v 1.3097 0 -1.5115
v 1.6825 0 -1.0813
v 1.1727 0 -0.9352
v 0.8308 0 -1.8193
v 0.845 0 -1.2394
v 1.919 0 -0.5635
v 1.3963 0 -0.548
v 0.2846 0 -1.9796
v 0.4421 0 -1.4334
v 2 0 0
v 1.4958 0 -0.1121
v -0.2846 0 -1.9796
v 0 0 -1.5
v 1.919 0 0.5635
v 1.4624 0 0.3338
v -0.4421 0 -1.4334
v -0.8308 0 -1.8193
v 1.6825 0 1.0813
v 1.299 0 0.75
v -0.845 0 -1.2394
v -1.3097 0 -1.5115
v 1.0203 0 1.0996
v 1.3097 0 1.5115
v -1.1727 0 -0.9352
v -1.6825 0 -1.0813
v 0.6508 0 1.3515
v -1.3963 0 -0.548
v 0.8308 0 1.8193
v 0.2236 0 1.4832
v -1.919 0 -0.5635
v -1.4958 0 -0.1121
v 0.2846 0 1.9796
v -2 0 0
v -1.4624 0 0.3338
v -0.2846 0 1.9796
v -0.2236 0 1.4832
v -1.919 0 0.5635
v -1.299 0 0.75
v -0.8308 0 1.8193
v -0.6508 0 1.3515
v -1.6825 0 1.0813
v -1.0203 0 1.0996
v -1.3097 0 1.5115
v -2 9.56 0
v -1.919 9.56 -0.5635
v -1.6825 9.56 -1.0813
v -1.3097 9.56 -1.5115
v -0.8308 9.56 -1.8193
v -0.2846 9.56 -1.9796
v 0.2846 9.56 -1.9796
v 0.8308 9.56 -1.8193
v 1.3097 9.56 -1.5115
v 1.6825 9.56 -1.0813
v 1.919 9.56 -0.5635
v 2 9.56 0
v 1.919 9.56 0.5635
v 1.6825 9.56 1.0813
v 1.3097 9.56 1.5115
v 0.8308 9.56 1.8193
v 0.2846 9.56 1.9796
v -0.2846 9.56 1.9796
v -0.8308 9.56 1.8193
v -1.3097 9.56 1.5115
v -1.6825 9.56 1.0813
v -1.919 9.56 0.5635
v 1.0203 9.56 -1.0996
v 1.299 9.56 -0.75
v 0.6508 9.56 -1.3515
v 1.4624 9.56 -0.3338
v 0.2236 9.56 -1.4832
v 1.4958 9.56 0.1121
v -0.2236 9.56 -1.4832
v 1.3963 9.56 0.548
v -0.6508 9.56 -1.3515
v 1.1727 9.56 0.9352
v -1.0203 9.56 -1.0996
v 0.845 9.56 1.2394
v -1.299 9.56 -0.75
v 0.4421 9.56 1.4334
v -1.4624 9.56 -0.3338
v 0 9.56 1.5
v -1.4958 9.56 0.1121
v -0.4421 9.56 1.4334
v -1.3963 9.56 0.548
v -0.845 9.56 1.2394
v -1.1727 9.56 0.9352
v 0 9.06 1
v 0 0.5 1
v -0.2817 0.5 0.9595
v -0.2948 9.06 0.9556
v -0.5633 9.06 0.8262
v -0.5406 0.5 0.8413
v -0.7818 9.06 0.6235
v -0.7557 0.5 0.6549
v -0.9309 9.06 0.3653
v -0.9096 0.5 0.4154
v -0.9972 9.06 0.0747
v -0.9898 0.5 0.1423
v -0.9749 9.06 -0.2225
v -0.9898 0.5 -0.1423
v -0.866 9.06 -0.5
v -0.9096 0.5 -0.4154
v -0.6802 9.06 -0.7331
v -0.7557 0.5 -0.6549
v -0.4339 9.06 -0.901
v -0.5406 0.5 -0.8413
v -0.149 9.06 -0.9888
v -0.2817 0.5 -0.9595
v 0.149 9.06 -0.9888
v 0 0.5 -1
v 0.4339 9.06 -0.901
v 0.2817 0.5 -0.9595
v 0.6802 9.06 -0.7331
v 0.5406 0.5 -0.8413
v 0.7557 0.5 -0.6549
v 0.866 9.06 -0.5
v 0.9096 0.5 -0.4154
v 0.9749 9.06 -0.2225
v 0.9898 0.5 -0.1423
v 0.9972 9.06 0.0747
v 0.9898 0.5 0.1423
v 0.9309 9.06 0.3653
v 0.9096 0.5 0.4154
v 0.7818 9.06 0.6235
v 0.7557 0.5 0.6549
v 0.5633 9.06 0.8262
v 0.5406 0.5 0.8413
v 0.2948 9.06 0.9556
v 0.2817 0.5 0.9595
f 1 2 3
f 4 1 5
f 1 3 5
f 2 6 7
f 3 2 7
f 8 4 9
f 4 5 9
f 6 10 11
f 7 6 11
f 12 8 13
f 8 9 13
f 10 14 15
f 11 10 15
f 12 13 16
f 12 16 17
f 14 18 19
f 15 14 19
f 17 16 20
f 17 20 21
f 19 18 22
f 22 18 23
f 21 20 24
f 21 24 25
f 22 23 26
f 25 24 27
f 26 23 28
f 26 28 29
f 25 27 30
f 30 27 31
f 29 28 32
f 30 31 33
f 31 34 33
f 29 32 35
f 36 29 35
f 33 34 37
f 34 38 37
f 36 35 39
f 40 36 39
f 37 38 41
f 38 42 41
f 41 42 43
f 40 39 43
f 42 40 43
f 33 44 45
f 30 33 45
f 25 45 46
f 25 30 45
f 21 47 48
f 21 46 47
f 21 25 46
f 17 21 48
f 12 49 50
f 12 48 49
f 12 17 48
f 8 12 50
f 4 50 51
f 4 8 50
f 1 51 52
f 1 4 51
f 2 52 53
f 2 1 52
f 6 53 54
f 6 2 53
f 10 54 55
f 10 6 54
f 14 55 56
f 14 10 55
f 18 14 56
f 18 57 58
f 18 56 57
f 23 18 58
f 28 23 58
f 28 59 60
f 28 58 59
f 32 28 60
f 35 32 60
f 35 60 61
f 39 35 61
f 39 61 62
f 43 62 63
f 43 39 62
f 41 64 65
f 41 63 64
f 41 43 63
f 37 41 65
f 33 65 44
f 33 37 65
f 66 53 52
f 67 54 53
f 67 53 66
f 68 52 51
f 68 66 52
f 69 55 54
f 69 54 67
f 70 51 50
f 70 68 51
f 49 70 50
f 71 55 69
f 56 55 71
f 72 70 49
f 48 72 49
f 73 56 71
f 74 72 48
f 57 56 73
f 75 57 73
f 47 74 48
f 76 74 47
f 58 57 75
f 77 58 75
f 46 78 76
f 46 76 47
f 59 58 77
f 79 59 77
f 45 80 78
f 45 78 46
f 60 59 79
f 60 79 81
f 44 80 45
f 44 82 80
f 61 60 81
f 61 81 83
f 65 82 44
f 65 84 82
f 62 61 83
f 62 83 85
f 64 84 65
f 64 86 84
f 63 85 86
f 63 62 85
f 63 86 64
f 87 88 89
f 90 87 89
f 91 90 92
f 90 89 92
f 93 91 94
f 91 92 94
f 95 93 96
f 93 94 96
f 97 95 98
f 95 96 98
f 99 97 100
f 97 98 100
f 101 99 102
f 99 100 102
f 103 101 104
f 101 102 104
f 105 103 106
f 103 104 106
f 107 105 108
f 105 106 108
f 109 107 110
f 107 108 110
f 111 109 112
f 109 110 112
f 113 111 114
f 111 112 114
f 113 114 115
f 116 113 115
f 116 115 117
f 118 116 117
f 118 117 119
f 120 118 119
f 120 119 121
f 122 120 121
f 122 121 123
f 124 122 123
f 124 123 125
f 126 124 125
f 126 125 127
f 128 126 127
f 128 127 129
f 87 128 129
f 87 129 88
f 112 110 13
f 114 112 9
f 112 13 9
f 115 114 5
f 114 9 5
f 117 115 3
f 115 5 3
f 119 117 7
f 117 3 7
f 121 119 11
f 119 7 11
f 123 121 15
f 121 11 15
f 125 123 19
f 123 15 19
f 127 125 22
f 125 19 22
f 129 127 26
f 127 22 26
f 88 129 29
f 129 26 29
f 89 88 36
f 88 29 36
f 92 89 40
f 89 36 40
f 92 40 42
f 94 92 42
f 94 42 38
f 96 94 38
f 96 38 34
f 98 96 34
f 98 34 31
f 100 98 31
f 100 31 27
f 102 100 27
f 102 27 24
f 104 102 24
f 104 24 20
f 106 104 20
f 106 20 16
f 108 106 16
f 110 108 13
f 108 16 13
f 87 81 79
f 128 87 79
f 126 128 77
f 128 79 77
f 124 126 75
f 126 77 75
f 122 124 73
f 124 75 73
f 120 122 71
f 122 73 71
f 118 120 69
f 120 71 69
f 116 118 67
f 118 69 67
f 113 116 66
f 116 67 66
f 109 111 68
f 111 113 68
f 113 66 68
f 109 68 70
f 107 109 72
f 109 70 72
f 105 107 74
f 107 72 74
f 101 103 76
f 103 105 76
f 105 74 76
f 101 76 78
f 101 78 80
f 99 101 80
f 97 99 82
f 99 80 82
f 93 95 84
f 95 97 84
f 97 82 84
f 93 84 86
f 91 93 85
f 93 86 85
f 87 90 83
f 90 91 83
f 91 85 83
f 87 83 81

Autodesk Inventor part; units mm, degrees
ref_plane "YZ Plane" through (0, 0, 0) normal (1, 0, 0) x (0, 1, 0)
ref_plane "XZ Plane" through (0, 0, 0) normal (0, 1, 0) x (-1, 0, 0)
ref_plane "XY Plane" through (0, 0, 0) normal (0, 0, 1) x (1, 0, 0)
sketch "スケッチ1" plane through (0, 0, 0) normal (0, 1, 0) x (-1, 0, 0)
  circle A0 centre (0, 0) radius 2
  dimension "d0" = 4
extrude "押し出し1" add sketch "スケッチ1" along normal blind 9.56
sketch "スケッチ2" plane through (0, 9.56, 0) normal (0, 1, 0) x (1, 0, 0)
  point P0 (0, 0)
hole "穴1" at (0, 9.56, 0) direction (0, -1, 0) diameter 2 end through all countersink diameter 3 countersink angle 90 clearance for "Countersunk Flat Head Screw ISO 2009/7046" size "M2" standard "ISO"
sketch "スケッチ3" plane through (0, 0, 0) normal (0, -1, 0) x (1, 0, 0)
  point P0 (0, 0)
hole "穴2" at (0, 0, 0) direction (0, 1, 0) diameter 2 end through all countersink diameter 3 countersink angle 90 clearance for "Countersunk Flat Head Screw ISO 2009/7046" size "M2" standard "ISO"
properties part number "shaft" material "鉄、鋳鉄"
